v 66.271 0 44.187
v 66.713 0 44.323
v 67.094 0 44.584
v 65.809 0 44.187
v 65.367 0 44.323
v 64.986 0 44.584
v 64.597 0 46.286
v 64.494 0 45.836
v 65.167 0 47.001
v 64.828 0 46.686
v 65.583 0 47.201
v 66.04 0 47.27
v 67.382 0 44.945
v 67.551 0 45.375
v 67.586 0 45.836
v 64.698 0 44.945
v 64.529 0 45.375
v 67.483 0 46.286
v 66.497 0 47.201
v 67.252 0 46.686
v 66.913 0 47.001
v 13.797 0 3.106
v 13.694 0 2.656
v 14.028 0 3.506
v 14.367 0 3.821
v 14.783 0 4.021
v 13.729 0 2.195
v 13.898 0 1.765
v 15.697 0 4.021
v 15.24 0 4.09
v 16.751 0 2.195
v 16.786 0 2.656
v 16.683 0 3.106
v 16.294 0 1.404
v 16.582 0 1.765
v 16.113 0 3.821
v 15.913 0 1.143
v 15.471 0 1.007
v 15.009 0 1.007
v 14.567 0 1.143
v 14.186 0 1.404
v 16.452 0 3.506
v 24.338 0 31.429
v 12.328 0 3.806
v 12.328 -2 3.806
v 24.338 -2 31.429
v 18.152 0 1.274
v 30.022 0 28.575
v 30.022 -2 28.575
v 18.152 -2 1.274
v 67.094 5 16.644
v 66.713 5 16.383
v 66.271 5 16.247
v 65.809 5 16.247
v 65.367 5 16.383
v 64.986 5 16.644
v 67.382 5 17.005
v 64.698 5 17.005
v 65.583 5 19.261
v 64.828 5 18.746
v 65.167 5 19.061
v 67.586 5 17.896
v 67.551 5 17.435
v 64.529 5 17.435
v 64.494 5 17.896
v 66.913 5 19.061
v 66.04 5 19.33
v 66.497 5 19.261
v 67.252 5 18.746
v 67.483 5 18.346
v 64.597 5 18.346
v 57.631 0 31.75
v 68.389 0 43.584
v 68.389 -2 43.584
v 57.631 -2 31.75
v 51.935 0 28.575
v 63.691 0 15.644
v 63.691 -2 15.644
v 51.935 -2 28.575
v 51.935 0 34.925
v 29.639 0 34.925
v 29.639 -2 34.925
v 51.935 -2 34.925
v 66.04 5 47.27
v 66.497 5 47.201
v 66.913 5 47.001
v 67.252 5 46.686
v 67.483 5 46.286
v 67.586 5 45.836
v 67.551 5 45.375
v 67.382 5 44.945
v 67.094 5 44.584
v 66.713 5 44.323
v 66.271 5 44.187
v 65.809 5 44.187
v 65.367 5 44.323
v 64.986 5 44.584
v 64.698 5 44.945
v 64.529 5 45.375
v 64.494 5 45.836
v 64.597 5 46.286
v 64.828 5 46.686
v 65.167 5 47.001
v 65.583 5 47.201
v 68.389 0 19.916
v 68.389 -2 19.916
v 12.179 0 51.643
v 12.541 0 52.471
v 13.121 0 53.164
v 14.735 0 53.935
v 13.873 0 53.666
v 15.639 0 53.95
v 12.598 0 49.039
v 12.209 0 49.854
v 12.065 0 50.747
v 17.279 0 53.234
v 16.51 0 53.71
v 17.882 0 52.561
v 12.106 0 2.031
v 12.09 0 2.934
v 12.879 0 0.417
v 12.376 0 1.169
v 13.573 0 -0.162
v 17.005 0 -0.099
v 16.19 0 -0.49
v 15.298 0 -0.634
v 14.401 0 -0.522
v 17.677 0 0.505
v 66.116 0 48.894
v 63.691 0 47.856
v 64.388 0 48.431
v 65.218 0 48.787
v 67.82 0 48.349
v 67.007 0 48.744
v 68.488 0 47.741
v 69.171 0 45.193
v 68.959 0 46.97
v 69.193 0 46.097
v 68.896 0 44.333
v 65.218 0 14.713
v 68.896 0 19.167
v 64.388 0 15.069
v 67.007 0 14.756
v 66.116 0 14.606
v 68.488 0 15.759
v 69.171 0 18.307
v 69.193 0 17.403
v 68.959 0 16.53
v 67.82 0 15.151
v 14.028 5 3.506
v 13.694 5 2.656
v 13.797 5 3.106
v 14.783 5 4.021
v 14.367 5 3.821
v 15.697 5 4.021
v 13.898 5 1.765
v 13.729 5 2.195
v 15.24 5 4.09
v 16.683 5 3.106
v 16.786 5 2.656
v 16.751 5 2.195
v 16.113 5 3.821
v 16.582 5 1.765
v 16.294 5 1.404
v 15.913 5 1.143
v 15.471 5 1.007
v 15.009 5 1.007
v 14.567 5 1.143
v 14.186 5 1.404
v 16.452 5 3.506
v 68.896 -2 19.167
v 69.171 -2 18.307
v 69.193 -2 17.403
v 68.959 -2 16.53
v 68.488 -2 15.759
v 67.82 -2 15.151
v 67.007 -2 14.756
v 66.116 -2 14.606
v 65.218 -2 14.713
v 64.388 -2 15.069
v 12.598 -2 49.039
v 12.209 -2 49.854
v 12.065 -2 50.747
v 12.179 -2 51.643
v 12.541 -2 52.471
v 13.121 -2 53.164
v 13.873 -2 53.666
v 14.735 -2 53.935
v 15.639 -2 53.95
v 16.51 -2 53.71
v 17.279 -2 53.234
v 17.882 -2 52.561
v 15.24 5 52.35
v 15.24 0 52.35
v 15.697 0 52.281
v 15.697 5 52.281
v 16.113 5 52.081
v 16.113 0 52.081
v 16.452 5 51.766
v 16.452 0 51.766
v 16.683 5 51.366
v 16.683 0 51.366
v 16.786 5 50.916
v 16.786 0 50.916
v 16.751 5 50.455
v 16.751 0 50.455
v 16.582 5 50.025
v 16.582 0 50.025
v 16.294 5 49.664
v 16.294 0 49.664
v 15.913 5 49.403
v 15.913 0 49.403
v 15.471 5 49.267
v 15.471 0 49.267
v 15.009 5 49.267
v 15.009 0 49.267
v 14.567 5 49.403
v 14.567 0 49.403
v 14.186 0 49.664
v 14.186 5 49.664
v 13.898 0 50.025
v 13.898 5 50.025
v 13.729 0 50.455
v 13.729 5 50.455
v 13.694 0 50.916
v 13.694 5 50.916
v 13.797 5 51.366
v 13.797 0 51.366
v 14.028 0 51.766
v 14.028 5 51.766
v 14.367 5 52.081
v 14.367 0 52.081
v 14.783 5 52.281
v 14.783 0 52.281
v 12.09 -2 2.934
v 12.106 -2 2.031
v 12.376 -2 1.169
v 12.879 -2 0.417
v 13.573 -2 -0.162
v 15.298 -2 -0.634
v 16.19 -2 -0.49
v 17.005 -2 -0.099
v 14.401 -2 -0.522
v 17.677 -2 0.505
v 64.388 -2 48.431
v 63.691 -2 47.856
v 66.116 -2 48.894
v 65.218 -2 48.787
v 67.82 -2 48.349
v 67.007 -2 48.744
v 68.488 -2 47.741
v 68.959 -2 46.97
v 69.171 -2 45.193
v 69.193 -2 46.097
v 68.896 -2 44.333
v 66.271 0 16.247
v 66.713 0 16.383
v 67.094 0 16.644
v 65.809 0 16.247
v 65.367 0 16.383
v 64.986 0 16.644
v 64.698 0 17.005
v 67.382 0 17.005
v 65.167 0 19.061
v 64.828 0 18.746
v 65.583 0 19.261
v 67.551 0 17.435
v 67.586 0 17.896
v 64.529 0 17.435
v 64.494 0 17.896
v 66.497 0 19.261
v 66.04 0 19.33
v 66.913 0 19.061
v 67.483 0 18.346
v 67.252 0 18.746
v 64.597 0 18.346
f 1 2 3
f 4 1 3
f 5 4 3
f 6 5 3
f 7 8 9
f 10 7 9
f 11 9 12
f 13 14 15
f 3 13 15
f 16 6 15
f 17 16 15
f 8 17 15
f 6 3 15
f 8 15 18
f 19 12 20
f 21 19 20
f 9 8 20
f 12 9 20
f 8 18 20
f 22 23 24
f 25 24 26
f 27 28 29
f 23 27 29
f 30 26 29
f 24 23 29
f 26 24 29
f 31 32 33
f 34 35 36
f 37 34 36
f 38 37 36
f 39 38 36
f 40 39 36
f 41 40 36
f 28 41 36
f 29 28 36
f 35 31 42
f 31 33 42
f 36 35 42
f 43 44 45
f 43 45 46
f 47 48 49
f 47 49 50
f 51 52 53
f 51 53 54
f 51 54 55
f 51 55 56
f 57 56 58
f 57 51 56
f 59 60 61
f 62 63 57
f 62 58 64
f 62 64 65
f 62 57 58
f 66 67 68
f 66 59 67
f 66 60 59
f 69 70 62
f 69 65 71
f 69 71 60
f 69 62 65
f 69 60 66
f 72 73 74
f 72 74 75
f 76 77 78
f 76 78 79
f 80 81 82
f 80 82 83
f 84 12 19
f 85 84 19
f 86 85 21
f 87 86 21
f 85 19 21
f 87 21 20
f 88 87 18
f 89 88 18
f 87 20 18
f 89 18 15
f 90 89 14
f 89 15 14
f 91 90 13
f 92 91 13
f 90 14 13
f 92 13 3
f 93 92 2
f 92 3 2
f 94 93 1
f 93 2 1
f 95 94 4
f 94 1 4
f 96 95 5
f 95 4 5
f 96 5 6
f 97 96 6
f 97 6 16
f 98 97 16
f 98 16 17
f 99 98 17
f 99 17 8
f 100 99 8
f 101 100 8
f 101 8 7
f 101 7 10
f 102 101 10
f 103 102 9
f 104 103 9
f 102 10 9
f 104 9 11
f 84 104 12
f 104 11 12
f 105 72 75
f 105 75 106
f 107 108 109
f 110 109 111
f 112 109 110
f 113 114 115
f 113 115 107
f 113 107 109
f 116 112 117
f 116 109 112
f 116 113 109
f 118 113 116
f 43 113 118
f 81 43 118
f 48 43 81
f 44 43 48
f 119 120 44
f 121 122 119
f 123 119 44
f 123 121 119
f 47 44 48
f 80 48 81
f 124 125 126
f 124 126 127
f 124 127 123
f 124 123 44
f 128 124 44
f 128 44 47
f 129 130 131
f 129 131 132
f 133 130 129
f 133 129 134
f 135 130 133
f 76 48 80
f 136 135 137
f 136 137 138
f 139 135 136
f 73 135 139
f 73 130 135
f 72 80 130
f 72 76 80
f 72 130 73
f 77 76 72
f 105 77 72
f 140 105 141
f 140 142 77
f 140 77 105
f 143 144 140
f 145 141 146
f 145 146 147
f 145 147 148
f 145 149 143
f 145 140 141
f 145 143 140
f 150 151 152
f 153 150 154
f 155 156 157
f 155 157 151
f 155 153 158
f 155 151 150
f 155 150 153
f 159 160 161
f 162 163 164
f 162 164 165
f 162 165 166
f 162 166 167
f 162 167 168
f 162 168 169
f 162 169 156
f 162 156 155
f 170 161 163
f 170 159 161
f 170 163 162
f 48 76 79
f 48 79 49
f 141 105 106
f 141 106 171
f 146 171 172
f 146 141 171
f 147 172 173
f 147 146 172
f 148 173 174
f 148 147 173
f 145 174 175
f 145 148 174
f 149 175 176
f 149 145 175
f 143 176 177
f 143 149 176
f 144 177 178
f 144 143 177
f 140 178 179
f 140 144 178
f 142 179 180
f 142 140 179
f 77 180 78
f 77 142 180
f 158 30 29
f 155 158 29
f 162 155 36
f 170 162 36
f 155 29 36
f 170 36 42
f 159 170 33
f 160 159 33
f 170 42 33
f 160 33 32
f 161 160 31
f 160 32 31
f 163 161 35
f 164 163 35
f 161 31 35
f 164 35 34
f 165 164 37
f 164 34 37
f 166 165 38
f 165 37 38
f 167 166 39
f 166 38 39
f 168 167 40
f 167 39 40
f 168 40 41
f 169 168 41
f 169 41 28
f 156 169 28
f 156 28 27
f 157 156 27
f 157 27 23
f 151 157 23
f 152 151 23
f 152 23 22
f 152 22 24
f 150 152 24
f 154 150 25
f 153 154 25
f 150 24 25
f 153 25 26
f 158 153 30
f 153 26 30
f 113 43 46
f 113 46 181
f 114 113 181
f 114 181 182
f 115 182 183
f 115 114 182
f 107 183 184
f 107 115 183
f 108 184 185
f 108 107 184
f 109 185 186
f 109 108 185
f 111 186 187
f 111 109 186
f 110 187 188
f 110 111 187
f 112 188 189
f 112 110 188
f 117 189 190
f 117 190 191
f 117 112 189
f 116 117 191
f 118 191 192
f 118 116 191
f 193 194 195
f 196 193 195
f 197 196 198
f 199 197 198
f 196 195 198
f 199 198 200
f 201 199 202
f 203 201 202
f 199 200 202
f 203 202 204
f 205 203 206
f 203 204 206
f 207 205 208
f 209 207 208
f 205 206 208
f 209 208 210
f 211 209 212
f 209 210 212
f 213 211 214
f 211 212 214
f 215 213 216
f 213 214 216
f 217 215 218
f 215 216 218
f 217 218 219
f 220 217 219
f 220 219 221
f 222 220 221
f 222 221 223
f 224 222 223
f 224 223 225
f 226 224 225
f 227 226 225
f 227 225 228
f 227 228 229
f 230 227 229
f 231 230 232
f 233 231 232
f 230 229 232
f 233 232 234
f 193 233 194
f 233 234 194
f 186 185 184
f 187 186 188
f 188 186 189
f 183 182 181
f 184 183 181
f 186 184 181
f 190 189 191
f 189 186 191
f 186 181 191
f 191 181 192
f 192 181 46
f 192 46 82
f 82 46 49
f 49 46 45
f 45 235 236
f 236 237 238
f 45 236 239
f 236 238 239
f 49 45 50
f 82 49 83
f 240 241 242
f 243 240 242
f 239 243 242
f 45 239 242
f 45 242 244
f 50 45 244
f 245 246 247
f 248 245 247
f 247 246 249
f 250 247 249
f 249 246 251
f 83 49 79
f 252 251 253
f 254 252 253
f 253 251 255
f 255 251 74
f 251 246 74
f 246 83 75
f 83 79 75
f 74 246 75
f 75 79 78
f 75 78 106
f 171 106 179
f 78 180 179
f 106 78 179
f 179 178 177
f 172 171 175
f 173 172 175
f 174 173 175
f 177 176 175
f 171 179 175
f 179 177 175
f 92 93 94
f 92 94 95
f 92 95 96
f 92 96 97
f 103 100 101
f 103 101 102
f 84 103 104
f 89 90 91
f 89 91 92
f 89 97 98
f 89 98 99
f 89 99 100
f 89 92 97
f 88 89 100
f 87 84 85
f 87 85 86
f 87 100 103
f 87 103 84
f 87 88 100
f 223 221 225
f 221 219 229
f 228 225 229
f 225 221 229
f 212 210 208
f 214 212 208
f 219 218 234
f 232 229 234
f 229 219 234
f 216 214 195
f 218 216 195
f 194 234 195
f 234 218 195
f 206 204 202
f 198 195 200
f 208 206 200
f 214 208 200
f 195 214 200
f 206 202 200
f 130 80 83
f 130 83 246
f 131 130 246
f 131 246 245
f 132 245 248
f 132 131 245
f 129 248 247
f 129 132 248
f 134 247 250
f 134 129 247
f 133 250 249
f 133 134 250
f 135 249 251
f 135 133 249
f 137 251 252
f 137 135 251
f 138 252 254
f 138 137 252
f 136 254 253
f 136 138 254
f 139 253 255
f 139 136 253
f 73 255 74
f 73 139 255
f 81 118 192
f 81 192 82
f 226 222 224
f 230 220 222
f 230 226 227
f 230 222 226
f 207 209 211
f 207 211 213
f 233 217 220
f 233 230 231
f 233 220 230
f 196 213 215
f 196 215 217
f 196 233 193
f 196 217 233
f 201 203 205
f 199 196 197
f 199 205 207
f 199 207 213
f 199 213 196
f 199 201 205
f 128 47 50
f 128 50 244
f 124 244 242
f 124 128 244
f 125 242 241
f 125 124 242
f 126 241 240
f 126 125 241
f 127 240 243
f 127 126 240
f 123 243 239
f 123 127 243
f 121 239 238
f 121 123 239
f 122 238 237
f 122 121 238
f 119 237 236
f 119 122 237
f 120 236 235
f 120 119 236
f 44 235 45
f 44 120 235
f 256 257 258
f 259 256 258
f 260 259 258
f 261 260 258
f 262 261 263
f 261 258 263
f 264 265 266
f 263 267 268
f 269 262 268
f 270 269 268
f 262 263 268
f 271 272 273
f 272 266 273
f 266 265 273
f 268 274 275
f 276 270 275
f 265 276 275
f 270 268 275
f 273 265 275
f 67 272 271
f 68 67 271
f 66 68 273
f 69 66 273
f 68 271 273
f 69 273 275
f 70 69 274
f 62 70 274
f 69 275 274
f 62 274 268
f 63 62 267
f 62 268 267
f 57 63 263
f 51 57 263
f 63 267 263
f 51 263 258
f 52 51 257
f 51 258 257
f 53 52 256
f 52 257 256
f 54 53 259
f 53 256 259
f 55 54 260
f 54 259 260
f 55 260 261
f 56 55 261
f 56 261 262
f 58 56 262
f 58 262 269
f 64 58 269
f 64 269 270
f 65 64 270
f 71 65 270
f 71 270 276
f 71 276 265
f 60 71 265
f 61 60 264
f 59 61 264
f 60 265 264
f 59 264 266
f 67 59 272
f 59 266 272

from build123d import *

# Parameters (mm, degrees)
SKETCH1_R             = 1.55
BOSS_EXTRUDE1_DEPTH   = 5
BOSS_EXTRUDE1_2_DEPTH = 5
BOSS_EXTRUDE1_3_DEPTH = 5
BOSS_EXTRUDE1_4_DEPTH = 5
BOSS_EXTRUDE2_DEPTH   = 2


with BuildPart() as part:
    # Sketch1 → Boss-Extrude1 (new body)
    with BuildSketch(Plane(origin=(0, 0, 0), x_dir=(1, 0, 0), z_dir=(0, 1, 0))):
        with Locations((15.24, -50.8)):
            Circle(SKETCH1_R)
    extrude(amount=BOSS_EXTRUDE1_DEPTH)


with BuildPart() as body_2:
    # Sketch1 → Boss-Extrude1 2 (new body)
    with BuildSketch(Plane(origin=(0, 0, 0), x_dir=(1, 0, 0), z_dir=(0, 1, 0))):
        with Locations((15.24, -2.54)):
            Circle(SKETCH1_R)
    extrude(amount=BOSS_EXTRUDE1_2_DEPTH)


with BuildPart() as body_3:
    # Sketch1 → Boss-Extrude1 3 (new body)
    with BuildSketch(Plane(origin=(0, 0, 0), x_dir=(1, 0, 0), z_dir=(0, 1, 0))):
        with Locations((66.04, -17.78)):
            Circle(SKETCH1_R)
    extrude(amount=BOSS_EXTRUDE1_3_DEPTH)


with BuildPart() as body_4:
    # Sketch1 → Boss-Extrude1 4 (new body)
    with BuildSketch(Plane(origin=(0, 0, 0), x_dir=(1, 0, 0), z_dir=(0, 1, 0))):
        with Locations((66.04, -45.72)):
            Circle(SKETCH1_R)
    extrude(amount=BOSS_EXTRUDE1_4_DEPTH)


with BuildPart() as body_5:
    # Sketch1<3> → Boss-Extrude2 (new body)
    with BuildSketch(Plane(origin=(0, 0, 0), x_dir=(1, 0, 0), z_dir=(0, 1, 0))):
        with BuildLine():
            ThreePointArc((18.151697429, -1.274044596), (13.974044596, 0.371697429), (12.328302571, -3.805955404))
            Line((12.328302571, -3.805955404), (24.338244174, -31.428821089))
            Line((24.338244174, -31.428821089), (12.598240315, -49.038826877))
            ThreePointArc((12.598240315, -49.038826877), (13.478826877, -53.441759685), (17.881759685, -52.561173123))
            Line((17.881759685, -52.561173123), (29.639208433, -34.925))
            Line((29.639208433, -34.925), (51.935475612, -34.925))
            Line((51.935475612, -34.925), (63.690690267, -47.855736121))
            ThreePointArc((63.690690267, -47.855736121), (68.175736121, -48.069309733), (68.389309733, -43.584263879))
            Line((68.389309733, -43.584263879), (57.630888025, -31.75))
            Line((57.630888025, -31.75), (68.389309733, -19.915736121))
            ThreePointArc((68.389309733, -19.915736121), (68.175736121, -15.430690267), (63.690690267, -15.644263879))
            Line((63.690690267, -15.644263879), (51.935475612, -28.575))
            Line((51.935475612, -28.575), (30.021678039, -28.575))
            Line((30.021678039, -28.575), (18.151697429, -1.274044596))
        make_face()
    extrude(amount=-BOSS_EXTRUDE2_DEPTH)


solid = Compound([part.part, body_2.part, body_3.part, body_4.part, body_5.part])
